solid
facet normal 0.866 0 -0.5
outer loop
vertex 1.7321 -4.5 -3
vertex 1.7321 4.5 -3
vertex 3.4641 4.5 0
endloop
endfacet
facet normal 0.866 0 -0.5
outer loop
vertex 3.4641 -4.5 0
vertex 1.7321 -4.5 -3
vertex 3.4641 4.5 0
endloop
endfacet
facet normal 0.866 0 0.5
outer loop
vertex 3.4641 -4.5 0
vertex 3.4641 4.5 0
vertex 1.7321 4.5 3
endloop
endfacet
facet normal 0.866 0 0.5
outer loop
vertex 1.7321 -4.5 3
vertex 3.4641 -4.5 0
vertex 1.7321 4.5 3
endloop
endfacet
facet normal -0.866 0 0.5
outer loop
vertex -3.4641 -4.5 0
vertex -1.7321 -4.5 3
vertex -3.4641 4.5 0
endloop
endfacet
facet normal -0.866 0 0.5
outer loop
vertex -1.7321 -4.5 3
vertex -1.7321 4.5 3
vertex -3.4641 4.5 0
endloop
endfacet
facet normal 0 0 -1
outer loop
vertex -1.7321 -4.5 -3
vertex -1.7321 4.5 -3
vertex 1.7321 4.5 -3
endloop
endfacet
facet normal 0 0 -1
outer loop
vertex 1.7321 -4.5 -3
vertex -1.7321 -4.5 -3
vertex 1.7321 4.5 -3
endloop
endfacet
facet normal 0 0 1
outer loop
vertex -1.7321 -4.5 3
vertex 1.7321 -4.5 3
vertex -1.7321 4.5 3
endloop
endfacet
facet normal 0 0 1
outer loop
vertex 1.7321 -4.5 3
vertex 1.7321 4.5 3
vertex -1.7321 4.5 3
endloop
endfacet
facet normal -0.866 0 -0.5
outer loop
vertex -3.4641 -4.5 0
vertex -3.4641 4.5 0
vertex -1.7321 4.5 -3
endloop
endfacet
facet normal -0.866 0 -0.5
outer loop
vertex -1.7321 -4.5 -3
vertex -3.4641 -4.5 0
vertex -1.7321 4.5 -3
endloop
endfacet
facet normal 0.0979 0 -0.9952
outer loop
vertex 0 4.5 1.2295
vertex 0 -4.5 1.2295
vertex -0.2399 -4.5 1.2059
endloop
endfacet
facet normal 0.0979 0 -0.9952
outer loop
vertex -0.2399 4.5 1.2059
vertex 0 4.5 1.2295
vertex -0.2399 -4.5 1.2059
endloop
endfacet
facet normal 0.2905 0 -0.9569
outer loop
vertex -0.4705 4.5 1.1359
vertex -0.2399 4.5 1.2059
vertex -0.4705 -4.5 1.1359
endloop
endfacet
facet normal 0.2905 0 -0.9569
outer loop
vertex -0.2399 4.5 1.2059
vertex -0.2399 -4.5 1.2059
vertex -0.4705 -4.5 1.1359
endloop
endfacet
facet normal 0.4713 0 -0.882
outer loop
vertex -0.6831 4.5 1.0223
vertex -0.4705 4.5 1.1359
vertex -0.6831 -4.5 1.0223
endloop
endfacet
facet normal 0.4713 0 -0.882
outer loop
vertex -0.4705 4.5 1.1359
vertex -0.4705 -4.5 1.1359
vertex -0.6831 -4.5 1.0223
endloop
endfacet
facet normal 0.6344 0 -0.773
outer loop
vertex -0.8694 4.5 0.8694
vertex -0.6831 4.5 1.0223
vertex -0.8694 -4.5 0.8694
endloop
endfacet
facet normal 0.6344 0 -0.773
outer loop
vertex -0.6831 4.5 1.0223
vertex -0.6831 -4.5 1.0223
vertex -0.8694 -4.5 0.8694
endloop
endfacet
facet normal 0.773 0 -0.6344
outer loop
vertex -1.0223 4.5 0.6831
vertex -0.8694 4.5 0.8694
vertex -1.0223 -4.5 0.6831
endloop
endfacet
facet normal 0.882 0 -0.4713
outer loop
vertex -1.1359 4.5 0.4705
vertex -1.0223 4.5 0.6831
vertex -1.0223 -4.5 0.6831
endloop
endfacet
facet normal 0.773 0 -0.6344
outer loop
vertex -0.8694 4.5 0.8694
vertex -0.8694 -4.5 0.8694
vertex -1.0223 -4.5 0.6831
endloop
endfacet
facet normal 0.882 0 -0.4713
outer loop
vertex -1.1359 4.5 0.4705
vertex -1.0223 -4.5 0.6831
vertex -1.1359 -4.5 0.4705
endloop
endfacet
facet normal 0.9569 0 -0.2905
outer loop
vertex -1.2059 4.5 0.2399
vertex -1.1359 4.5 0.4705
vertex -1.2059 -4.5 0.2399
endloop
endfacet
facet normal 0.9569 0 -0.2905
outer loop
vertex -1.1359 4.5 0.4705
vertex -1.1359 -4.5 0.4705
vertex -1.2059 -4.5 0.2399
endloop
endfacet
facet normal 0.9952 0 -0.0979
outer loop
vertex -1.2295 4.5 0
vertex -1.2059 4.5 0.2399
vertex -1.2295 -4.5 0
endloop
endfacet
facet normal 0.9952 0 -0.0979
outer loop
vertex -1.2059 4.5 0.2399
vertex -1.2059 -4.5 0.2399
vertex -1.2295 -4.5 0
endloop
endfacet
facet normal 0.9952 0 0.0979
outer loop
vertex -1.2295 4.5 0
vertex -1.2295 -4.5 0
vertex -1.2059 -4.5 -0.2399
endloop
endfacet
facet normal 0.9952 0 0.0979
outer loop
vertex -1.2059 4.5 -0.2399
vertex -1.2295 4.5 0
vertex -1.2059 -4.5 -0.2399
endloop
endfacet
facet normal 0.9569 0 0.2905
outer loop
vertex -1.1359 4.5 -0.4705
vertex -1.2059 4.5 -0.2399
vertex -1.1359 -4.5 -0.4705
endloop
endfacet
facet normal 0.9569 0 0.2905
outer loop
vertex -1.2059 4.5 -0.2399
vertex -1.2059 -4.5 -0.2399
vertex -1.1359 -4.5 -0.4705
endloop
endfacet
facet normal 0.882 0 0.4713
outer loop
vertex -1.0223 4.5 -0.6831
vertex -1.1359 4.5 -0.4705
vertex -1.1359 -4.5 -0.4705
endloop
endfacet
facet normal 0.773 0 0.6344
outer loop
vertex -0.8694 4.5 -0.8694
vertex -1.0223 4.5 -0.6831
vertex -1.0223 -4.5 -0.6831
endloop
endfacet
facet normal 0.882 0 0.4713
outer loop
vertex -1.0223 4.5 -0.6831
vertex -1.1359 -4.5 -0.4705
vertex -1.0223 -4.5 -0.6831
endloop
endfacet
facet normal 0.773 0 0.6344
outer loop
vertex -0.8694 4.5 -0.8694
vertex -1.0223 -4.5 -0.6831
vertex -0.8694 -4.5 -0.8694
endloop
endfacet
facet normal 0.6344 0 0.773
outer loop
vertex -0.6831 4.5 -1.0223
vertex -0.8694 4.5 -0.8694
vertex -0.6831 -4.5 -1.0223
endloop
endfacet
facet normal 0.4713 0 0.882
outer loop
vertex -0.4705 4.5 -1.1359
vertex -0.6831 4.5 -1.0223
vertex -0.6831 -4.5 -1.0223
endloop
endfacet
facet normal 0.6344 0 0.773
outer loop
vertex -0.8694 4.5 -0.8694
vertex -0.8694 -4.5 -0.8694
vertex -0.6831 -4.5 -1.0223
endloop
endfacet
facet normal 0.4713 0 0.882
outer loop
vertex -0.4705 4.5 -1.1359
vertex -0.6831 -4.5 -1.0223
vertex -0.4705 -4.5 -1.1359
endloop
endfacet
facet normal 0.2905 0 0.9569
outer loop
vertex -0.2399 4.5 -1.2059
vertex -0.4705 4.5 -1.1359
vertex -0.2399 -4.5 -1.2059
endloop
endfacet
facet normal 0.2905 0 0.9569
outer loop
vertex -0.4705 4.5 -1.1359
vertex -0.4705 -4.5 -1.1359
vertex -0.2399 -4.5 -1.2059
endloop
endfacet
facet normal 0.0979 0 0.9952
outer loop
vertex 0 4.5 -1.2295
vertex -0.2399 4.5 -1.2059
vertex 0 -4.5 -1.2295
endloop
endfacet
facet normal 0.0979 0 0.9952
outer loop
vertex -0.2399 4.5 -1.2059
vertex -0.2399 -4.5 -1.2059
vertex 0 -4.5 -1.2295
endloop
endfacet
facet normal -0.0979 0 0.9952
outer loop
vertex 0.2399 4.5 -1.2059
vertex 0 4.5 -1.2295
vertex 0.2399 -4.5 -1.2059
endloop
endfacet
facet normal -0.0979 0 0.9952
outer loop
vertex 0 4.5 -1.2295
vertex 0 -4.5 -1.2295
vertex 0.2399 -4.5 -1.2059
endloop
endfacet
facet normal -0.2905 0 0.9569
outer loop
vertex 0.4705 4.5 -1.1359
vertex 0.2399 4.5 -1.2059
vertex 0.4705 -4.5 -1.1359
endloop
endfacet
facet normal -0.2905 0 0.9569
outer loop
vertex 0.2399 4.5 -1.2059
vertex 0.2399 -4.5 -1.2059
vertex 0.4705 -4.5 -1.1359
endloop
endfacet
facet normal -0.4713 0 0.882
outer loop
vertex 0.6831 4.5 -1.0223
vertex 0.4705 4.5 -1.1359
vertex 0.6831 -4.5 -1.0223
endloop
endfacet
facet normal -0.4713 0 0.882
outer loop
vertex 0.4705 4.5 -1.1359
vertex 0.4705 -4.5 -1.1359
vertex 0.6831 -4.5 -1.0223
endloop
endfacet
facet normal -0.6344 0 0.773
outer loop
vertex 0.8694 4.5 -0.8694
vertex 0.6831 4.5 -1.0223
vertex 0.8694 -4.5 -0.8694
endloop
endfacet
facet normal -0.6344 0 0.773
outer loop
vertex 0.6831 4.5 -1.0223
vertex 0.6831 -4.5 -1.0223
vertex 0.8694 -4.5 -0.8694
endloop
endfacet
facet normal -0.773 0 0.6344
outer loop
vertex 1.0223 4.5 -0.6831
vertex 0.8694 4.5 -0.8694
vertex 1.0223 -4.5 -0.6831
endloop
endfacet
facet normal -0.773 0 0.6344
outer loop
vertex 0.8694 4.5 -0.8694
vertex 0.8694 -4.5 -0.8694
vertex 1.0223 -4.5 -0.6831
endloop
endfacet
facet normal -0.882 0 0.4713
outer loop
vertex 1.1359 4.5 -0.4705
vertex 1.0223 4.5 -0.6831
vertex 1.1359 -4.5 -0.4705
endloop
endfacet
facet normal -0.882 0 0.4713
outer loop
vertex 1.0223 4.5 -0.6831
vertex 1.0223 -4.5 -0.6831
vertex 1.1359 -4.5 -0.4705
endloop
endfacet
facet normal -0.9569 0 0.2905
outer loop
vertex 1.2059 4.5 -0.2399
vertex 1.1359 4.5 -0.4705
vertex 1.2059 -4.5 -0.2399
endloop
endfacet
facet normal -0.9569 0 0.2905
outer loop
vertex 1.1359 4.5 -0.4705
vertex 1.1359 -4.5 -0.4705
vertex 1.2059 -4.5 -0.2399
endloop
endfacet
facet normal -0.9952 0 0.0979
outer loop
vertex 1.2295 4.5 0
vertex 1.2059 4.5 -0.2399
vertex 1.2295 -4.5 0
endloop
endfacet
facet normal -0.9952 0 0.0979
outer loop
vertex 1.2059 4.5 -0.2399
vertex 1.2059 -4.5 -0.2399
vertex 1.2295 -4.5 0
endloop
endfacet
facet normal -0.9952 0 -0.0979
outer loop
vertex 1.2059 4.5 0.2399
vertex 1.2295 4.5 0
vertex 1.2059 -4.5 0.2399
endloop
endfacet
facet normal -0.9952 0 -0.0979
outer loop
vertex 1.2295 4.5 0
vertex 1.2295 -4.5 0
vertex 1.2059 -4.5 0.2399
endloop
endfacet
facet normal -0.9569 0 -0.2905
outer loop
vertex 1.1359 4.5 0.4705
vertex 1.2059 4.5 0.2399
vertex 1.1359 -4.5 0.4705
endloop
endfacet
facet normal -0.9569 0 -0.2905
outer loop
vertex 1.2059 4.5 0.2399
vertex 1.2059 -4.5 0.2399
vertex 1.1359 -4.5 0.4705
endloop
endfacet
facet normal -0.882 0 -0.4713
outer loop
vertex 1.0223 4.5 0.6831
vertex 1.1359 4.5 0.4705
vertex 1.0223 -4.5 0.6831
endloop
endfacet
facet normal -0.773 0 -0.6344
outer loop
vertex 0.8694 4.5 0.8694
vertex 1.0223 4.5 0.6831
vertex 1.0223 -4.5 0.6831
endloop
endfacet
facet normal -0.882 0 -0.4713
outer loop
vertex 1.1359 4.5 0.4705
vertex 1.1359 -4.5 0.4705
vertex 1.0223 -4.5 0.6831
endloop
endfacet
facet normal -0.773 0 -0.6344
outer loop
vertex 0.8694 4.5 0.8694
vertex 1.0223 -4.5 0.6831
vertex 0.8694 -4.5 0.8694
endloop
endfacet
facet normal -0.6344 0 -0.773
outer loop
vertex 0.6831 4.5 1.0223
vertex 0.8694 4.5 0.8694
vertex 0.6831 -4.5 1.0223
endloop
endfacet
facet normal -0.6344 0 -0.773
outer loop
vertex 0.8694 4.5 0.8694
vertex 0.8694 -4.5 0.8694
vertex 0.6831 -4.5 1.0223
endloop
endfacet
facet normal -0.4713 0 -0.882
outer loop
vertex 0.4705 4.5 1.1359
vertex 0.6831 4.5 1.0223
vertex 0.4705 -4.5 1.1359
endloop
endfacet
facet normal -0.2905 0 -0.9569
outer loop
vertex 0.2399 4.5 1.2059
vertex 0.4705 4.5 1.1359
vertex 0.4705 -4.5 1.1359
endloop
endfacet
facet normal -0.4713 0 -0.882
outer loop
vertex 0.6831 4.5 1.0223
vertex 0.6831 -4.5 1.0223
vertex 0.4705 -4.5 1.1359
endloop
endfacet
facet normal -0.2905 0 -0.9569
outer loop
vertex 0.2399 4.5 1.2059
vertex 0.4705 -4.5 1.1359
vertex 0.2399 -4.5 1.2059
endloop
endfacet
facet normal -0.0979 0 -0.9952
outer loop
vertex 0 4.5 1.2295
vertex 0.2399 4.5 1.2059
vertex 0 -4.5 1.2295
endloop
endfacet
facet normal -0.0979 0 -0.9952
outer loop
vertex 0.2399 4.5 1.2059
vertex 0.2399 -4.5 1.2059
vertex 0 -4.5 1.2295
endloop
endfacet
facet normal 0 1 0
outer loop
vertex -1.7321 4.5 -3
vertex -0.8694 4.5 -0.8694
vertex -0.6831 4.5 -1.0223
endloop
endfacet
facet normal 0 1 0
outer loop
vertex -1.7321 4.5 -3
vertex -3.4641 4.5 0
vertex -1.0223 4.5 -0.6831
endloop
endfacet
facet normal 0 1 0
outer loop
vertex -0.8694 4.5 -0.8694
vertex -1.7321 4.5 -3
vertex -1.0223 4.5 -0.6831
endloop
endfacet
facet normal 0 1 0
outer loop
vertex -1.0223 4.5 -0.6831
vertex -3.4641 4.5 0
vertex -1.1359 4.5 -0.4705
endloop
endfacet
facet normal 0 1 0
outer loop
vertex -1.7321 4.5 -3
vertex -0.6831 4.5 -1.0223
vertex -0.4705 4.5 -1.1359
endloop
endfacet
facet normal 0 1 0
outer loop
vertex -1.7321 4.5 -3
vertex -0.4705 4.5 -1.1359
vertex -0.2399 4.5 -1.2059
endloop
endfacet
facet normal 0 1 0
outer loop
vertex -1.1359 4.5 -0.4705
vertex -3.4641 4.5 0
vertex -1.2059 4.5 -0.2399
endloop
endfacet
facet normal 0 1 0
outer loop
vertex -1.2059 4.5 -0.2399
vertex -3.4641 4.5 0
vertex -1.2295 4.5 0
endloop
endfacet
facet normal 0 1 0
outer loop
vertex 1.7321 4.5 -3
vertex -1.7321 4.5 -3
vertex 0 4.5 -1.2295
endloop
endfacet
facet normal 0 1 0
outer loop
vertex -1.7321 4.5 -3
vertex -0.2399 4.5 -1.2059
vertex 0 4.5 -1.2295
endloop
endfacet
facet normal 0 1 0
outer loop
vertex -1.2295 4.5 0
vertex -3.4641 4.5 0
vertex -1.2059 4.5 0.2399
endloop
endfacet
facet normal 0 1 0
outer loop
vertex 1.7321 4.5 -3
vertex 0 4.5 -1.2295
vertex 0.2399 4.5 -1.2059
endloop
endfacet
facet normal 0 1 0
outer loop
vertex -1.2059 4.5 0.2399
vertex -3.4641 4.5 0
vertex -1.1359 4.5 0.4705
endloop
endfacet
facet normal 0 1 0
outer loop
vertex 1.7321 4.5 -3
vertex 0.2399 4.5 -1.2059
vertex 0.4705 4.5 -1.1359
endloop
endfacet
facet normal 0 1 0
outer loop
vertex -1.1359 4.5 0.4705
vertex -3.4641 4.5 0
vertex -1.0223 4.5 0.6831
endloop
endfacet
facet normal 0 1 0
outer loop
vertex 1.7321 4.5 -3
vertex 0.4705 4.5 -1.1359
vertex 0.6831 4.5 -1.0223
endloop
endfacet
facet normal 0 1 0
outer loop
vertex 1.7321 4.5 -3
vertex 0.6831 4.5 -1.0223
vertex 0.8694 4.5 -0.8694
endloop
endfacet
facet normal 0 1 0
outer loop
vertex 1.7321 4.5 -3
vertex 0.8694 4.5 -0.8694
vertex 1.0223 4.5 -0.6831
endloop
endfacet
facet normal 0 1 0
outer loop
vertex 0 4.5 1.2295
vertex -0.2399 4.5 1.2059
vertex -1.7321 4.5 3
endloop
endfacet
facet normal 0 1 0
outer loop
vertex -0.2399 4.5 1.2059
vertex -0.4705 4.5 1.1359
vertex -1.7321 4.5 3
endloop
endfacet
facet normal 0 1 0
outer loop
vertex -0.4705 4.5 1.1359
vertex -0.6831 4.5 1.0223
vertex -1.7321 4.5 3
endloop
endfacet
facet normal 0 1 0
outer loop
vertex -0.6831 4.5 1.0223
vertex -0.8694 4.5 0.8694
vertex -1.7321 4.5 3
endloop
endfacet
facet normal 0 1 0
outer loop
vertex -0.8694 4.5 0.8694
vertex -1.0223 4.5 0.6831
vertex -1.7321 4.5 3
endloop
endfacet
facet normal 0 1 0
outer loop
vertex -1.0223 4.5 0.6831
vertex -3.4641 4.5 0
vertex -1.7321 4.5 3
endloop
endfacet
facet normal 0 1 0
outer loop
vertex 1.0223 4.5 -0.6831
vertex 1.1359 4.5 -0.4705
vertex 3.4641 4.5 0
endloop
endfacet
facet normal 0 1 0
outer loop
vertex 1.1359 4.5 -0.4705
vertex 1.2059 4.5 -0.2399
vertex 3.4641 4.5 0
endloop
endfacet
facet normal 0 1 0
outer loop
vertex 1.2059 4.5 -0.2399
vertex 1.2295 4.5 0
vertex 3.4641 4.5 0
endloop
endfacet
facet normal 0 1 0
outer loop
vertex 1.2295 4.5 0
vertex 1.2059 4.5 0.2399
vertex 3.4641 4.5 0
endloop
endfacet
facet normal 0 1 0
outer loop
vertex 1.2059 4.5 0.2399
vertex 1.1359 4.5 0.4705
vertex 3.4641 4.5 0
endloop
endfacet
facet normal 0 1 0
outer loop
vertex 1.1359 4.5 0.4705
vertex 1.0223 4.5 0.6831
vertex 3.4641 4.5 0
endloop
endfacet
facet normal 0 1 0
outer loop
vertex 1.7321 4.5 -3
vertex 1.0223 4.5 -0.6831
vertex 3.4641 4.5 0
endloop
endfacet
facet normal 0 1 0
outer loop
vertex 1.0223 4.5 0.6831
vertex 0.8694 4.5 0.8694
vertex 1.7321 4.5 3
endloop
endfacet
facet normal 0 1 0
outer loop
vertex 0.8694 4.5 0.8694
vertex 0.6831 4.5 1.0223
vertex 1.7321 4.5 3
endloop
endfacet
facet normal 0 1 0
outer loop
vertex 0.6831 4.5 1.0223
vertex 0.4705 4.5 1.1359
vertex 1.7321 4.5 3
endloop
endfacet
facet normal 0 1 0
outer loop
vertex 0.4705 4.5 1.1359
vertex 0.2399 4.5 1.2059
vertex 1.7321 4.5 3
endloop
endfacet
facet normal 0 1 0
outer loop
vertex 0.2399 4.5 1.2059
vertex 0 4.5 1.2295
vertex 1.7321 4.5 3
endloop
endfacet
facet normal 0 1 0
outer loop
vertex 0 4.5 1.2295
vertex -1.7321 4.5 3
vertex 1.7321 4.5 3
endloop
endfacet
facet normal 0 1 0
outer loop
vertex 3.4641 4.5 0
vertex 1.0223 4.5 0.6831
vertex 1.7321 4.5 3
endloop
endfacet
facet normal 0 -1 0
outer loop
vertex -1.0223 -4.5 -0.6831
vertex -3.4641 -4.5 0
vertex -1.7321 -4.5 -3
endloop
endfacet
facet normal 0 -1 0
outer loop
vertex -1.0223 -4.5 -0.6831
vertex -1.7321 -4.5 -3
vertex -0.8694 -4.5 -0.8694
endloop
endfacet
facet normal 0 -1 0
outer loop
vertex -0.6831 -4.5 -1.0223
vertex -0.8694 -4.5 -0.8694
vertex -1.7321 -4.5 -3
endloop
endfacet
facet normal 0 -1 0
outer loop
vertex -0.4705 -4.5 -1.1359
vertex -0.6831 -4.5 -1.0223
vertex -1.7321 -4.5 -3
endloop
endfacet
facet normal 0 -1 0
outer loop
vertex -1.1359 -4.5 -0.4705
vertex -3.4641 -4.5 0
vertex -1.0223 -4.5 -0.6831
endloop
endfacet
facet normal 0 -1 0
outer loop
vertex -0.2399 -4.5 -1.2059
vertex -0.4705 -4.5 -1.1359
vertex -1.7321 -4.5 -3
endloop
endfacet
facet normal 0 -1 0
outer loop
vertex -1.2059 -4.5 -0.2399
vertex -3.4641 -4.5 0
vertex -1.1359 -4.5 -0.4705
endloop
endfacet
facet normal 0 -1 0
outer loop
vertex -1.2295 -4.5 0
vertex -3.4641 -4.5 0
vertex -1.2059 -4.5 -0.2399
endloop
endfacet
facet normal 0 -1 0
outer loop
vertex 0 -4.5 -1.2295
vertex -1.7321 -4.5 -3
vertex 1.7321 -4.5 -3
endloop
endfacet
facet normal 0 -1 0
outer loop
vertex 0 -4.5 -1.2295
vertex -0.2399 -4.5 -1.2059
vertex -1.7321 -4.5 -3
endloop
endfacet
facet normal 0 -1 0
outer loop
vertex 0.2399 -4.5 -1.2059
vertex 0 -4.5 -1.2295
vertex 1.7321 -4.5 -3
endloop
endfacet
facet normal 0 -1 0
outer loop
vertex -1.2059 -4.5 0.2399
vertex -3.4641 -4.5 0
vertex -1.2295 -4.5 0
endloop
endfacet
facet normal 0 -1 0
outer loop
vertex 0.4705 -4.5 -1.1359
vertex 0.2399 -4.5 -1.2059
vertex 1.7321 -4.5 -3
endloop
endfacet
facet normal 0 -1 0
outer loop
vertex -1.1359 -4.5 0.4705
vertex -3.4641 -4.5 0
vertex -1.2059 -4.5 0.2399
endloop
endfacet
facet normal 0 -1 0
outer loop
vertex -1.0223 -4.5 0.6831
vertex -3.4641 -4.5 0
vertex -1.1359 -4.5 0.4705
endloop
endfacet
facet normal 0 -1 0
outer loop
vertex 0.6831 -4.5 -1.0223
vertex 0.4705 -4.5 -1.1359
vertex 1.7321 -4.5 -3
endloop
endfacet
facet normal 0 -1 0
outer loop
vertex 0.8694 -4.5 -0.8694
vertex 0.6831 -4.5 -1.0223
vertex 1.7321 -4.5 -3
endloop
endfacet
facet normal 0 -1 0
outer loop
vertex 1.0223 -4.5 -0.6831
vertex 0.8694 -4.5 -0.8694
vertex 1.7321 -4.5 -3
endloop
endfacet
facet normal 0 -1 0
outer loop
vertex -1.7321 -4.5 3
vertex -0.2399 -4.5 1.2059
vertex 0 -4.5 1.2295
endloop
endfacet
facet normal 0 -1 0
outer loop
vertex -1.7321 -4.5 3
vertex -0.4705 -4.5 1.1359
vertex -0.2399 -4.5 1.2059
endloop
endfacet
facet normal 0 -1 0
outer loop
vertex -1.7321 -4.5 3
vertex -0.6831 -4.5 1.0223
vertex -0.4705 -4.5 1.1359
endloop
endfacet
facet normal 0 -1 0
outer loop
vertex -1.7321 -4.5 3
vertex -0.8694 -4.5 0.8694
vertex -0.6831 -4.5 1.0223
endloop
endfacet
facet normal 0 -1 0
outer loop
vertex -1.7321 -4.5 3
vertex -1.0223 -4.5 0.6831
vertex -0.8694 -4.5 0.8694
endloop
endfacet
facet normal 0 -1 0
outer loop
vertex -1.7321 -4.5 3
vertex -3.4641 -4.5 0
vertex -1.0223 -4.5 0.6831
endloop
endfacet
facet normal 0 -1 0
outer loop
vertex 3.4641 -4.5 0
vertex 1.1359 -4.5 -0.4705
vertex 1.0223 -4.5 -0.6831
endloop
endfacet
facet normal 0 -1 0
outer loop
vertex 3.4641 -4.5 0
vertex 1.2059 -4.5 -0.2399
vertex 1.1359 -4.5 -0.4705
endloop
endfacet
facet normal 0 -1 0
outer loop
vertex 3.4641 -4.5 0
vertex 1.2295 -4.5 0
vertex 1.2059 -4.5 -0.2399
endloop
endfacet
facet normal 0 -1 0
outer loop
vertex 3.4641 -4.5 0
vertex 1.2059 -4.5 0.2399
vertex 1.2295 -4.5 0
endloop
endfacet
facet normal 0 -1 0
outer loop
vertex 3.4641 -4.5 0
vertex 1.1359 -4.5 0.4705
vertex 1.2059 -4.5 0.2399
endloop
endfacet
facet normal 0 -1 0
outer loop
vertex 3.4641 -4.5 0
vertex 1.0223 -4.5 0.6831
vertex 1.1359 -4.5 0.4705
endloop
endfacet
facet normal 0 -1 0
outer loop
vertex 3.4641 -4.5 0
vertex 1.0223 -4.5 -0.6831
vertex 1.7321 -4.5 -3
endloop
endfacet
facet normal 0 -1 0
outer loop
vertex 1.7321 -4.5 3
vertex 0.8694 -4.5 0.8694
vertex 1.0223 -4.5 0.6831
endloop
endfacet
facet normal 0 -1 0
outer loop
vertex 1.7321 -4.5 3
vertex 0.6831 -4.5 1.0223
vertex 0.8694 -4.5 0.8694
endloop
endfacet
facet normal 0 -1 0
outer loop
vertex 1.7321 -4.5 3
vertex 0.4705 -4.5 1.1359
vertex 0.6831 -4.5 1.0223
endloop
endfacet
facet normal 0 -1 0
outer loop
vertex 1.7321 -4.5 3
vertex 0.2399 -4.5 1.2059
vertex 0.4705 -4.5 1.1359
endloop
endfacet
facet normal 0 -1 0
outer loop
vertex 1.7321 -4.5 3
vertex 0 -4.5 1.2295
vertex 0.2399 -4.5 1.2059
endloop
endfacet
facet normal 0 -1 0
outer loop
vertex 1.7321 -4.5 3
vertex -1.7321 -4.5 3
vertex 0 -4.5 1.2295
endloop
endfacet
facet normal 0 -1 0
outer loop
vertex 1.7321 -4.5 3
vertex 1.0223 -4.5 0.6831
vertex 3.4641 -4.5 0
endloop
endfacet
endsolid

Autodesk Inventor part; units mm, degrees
ref_plane "YZ Plane" through (0, 0, 0) normal (1, 0, 0) x (0, 1, 0)
ref_plane "XZ Plane" through (0, 0, 0) normal (0, 1, 0) x (-1, 0, 0)
ref_plane "XY Plane" through (0, 0, 0) normal (0, 0, 1) x (1, 0, 0)
sketch "スケッチ1" plane through (0, 0, 0) normal (0, 0, 1) x (1, 0, 0)
  line L0 (0, 4.5) -> (0, -4.5)
  line L1 (0, -4.5) -> (5.1962, -4.5)
  line L2 (5.1962, -4.5) -> (5.1962, 4.5)
  line L3 (5.1962, 4.5) -> (0, 4.5)
  point P0 (0, 0)
  point P1 (0, 0)
  dimension "d0" = 9
  dimension "d1" = 5.1962
revolve "回転1" add sketch "スケッチ1" angle 360 about axis through (0, 4.5, 0) along (0, -1, 0)
sketch "スケッチ2" plane through (0, 4.5, 0) normal (0, 1, 0) x (1, 0, 0)
  line L0 (3.4641, 0) -> (1.7321, -3)
  line L1 (1.7321, -3) -> (-1.7321, -3)
  line L2 (-1.7321, -3) -> (-3.4641, 0)
  line L3 (-3.4641, 0) -> (-1.7321, 3)
  line L4 (-1.7321, 3) -> (1.7321, 3)
  line L5 (1.7321, 3) -> (3.4641, 0)
  circle A0 centre (0, 0) radius 7.5191
  point P0 (0, 0)
  dimension "d3" = 6
extrude "押し出し1" cut sketch "スケッチ2" against normal through all
hole "穴1" at (0, 4.5, 0) direction (0, -1, 0) diameter 2.459 end through all thread size "M3x0.5" class "6H" standard "ISO Metric profile"
properties part number "ASU-309-6" material "アルミニウム 2014-T4"
